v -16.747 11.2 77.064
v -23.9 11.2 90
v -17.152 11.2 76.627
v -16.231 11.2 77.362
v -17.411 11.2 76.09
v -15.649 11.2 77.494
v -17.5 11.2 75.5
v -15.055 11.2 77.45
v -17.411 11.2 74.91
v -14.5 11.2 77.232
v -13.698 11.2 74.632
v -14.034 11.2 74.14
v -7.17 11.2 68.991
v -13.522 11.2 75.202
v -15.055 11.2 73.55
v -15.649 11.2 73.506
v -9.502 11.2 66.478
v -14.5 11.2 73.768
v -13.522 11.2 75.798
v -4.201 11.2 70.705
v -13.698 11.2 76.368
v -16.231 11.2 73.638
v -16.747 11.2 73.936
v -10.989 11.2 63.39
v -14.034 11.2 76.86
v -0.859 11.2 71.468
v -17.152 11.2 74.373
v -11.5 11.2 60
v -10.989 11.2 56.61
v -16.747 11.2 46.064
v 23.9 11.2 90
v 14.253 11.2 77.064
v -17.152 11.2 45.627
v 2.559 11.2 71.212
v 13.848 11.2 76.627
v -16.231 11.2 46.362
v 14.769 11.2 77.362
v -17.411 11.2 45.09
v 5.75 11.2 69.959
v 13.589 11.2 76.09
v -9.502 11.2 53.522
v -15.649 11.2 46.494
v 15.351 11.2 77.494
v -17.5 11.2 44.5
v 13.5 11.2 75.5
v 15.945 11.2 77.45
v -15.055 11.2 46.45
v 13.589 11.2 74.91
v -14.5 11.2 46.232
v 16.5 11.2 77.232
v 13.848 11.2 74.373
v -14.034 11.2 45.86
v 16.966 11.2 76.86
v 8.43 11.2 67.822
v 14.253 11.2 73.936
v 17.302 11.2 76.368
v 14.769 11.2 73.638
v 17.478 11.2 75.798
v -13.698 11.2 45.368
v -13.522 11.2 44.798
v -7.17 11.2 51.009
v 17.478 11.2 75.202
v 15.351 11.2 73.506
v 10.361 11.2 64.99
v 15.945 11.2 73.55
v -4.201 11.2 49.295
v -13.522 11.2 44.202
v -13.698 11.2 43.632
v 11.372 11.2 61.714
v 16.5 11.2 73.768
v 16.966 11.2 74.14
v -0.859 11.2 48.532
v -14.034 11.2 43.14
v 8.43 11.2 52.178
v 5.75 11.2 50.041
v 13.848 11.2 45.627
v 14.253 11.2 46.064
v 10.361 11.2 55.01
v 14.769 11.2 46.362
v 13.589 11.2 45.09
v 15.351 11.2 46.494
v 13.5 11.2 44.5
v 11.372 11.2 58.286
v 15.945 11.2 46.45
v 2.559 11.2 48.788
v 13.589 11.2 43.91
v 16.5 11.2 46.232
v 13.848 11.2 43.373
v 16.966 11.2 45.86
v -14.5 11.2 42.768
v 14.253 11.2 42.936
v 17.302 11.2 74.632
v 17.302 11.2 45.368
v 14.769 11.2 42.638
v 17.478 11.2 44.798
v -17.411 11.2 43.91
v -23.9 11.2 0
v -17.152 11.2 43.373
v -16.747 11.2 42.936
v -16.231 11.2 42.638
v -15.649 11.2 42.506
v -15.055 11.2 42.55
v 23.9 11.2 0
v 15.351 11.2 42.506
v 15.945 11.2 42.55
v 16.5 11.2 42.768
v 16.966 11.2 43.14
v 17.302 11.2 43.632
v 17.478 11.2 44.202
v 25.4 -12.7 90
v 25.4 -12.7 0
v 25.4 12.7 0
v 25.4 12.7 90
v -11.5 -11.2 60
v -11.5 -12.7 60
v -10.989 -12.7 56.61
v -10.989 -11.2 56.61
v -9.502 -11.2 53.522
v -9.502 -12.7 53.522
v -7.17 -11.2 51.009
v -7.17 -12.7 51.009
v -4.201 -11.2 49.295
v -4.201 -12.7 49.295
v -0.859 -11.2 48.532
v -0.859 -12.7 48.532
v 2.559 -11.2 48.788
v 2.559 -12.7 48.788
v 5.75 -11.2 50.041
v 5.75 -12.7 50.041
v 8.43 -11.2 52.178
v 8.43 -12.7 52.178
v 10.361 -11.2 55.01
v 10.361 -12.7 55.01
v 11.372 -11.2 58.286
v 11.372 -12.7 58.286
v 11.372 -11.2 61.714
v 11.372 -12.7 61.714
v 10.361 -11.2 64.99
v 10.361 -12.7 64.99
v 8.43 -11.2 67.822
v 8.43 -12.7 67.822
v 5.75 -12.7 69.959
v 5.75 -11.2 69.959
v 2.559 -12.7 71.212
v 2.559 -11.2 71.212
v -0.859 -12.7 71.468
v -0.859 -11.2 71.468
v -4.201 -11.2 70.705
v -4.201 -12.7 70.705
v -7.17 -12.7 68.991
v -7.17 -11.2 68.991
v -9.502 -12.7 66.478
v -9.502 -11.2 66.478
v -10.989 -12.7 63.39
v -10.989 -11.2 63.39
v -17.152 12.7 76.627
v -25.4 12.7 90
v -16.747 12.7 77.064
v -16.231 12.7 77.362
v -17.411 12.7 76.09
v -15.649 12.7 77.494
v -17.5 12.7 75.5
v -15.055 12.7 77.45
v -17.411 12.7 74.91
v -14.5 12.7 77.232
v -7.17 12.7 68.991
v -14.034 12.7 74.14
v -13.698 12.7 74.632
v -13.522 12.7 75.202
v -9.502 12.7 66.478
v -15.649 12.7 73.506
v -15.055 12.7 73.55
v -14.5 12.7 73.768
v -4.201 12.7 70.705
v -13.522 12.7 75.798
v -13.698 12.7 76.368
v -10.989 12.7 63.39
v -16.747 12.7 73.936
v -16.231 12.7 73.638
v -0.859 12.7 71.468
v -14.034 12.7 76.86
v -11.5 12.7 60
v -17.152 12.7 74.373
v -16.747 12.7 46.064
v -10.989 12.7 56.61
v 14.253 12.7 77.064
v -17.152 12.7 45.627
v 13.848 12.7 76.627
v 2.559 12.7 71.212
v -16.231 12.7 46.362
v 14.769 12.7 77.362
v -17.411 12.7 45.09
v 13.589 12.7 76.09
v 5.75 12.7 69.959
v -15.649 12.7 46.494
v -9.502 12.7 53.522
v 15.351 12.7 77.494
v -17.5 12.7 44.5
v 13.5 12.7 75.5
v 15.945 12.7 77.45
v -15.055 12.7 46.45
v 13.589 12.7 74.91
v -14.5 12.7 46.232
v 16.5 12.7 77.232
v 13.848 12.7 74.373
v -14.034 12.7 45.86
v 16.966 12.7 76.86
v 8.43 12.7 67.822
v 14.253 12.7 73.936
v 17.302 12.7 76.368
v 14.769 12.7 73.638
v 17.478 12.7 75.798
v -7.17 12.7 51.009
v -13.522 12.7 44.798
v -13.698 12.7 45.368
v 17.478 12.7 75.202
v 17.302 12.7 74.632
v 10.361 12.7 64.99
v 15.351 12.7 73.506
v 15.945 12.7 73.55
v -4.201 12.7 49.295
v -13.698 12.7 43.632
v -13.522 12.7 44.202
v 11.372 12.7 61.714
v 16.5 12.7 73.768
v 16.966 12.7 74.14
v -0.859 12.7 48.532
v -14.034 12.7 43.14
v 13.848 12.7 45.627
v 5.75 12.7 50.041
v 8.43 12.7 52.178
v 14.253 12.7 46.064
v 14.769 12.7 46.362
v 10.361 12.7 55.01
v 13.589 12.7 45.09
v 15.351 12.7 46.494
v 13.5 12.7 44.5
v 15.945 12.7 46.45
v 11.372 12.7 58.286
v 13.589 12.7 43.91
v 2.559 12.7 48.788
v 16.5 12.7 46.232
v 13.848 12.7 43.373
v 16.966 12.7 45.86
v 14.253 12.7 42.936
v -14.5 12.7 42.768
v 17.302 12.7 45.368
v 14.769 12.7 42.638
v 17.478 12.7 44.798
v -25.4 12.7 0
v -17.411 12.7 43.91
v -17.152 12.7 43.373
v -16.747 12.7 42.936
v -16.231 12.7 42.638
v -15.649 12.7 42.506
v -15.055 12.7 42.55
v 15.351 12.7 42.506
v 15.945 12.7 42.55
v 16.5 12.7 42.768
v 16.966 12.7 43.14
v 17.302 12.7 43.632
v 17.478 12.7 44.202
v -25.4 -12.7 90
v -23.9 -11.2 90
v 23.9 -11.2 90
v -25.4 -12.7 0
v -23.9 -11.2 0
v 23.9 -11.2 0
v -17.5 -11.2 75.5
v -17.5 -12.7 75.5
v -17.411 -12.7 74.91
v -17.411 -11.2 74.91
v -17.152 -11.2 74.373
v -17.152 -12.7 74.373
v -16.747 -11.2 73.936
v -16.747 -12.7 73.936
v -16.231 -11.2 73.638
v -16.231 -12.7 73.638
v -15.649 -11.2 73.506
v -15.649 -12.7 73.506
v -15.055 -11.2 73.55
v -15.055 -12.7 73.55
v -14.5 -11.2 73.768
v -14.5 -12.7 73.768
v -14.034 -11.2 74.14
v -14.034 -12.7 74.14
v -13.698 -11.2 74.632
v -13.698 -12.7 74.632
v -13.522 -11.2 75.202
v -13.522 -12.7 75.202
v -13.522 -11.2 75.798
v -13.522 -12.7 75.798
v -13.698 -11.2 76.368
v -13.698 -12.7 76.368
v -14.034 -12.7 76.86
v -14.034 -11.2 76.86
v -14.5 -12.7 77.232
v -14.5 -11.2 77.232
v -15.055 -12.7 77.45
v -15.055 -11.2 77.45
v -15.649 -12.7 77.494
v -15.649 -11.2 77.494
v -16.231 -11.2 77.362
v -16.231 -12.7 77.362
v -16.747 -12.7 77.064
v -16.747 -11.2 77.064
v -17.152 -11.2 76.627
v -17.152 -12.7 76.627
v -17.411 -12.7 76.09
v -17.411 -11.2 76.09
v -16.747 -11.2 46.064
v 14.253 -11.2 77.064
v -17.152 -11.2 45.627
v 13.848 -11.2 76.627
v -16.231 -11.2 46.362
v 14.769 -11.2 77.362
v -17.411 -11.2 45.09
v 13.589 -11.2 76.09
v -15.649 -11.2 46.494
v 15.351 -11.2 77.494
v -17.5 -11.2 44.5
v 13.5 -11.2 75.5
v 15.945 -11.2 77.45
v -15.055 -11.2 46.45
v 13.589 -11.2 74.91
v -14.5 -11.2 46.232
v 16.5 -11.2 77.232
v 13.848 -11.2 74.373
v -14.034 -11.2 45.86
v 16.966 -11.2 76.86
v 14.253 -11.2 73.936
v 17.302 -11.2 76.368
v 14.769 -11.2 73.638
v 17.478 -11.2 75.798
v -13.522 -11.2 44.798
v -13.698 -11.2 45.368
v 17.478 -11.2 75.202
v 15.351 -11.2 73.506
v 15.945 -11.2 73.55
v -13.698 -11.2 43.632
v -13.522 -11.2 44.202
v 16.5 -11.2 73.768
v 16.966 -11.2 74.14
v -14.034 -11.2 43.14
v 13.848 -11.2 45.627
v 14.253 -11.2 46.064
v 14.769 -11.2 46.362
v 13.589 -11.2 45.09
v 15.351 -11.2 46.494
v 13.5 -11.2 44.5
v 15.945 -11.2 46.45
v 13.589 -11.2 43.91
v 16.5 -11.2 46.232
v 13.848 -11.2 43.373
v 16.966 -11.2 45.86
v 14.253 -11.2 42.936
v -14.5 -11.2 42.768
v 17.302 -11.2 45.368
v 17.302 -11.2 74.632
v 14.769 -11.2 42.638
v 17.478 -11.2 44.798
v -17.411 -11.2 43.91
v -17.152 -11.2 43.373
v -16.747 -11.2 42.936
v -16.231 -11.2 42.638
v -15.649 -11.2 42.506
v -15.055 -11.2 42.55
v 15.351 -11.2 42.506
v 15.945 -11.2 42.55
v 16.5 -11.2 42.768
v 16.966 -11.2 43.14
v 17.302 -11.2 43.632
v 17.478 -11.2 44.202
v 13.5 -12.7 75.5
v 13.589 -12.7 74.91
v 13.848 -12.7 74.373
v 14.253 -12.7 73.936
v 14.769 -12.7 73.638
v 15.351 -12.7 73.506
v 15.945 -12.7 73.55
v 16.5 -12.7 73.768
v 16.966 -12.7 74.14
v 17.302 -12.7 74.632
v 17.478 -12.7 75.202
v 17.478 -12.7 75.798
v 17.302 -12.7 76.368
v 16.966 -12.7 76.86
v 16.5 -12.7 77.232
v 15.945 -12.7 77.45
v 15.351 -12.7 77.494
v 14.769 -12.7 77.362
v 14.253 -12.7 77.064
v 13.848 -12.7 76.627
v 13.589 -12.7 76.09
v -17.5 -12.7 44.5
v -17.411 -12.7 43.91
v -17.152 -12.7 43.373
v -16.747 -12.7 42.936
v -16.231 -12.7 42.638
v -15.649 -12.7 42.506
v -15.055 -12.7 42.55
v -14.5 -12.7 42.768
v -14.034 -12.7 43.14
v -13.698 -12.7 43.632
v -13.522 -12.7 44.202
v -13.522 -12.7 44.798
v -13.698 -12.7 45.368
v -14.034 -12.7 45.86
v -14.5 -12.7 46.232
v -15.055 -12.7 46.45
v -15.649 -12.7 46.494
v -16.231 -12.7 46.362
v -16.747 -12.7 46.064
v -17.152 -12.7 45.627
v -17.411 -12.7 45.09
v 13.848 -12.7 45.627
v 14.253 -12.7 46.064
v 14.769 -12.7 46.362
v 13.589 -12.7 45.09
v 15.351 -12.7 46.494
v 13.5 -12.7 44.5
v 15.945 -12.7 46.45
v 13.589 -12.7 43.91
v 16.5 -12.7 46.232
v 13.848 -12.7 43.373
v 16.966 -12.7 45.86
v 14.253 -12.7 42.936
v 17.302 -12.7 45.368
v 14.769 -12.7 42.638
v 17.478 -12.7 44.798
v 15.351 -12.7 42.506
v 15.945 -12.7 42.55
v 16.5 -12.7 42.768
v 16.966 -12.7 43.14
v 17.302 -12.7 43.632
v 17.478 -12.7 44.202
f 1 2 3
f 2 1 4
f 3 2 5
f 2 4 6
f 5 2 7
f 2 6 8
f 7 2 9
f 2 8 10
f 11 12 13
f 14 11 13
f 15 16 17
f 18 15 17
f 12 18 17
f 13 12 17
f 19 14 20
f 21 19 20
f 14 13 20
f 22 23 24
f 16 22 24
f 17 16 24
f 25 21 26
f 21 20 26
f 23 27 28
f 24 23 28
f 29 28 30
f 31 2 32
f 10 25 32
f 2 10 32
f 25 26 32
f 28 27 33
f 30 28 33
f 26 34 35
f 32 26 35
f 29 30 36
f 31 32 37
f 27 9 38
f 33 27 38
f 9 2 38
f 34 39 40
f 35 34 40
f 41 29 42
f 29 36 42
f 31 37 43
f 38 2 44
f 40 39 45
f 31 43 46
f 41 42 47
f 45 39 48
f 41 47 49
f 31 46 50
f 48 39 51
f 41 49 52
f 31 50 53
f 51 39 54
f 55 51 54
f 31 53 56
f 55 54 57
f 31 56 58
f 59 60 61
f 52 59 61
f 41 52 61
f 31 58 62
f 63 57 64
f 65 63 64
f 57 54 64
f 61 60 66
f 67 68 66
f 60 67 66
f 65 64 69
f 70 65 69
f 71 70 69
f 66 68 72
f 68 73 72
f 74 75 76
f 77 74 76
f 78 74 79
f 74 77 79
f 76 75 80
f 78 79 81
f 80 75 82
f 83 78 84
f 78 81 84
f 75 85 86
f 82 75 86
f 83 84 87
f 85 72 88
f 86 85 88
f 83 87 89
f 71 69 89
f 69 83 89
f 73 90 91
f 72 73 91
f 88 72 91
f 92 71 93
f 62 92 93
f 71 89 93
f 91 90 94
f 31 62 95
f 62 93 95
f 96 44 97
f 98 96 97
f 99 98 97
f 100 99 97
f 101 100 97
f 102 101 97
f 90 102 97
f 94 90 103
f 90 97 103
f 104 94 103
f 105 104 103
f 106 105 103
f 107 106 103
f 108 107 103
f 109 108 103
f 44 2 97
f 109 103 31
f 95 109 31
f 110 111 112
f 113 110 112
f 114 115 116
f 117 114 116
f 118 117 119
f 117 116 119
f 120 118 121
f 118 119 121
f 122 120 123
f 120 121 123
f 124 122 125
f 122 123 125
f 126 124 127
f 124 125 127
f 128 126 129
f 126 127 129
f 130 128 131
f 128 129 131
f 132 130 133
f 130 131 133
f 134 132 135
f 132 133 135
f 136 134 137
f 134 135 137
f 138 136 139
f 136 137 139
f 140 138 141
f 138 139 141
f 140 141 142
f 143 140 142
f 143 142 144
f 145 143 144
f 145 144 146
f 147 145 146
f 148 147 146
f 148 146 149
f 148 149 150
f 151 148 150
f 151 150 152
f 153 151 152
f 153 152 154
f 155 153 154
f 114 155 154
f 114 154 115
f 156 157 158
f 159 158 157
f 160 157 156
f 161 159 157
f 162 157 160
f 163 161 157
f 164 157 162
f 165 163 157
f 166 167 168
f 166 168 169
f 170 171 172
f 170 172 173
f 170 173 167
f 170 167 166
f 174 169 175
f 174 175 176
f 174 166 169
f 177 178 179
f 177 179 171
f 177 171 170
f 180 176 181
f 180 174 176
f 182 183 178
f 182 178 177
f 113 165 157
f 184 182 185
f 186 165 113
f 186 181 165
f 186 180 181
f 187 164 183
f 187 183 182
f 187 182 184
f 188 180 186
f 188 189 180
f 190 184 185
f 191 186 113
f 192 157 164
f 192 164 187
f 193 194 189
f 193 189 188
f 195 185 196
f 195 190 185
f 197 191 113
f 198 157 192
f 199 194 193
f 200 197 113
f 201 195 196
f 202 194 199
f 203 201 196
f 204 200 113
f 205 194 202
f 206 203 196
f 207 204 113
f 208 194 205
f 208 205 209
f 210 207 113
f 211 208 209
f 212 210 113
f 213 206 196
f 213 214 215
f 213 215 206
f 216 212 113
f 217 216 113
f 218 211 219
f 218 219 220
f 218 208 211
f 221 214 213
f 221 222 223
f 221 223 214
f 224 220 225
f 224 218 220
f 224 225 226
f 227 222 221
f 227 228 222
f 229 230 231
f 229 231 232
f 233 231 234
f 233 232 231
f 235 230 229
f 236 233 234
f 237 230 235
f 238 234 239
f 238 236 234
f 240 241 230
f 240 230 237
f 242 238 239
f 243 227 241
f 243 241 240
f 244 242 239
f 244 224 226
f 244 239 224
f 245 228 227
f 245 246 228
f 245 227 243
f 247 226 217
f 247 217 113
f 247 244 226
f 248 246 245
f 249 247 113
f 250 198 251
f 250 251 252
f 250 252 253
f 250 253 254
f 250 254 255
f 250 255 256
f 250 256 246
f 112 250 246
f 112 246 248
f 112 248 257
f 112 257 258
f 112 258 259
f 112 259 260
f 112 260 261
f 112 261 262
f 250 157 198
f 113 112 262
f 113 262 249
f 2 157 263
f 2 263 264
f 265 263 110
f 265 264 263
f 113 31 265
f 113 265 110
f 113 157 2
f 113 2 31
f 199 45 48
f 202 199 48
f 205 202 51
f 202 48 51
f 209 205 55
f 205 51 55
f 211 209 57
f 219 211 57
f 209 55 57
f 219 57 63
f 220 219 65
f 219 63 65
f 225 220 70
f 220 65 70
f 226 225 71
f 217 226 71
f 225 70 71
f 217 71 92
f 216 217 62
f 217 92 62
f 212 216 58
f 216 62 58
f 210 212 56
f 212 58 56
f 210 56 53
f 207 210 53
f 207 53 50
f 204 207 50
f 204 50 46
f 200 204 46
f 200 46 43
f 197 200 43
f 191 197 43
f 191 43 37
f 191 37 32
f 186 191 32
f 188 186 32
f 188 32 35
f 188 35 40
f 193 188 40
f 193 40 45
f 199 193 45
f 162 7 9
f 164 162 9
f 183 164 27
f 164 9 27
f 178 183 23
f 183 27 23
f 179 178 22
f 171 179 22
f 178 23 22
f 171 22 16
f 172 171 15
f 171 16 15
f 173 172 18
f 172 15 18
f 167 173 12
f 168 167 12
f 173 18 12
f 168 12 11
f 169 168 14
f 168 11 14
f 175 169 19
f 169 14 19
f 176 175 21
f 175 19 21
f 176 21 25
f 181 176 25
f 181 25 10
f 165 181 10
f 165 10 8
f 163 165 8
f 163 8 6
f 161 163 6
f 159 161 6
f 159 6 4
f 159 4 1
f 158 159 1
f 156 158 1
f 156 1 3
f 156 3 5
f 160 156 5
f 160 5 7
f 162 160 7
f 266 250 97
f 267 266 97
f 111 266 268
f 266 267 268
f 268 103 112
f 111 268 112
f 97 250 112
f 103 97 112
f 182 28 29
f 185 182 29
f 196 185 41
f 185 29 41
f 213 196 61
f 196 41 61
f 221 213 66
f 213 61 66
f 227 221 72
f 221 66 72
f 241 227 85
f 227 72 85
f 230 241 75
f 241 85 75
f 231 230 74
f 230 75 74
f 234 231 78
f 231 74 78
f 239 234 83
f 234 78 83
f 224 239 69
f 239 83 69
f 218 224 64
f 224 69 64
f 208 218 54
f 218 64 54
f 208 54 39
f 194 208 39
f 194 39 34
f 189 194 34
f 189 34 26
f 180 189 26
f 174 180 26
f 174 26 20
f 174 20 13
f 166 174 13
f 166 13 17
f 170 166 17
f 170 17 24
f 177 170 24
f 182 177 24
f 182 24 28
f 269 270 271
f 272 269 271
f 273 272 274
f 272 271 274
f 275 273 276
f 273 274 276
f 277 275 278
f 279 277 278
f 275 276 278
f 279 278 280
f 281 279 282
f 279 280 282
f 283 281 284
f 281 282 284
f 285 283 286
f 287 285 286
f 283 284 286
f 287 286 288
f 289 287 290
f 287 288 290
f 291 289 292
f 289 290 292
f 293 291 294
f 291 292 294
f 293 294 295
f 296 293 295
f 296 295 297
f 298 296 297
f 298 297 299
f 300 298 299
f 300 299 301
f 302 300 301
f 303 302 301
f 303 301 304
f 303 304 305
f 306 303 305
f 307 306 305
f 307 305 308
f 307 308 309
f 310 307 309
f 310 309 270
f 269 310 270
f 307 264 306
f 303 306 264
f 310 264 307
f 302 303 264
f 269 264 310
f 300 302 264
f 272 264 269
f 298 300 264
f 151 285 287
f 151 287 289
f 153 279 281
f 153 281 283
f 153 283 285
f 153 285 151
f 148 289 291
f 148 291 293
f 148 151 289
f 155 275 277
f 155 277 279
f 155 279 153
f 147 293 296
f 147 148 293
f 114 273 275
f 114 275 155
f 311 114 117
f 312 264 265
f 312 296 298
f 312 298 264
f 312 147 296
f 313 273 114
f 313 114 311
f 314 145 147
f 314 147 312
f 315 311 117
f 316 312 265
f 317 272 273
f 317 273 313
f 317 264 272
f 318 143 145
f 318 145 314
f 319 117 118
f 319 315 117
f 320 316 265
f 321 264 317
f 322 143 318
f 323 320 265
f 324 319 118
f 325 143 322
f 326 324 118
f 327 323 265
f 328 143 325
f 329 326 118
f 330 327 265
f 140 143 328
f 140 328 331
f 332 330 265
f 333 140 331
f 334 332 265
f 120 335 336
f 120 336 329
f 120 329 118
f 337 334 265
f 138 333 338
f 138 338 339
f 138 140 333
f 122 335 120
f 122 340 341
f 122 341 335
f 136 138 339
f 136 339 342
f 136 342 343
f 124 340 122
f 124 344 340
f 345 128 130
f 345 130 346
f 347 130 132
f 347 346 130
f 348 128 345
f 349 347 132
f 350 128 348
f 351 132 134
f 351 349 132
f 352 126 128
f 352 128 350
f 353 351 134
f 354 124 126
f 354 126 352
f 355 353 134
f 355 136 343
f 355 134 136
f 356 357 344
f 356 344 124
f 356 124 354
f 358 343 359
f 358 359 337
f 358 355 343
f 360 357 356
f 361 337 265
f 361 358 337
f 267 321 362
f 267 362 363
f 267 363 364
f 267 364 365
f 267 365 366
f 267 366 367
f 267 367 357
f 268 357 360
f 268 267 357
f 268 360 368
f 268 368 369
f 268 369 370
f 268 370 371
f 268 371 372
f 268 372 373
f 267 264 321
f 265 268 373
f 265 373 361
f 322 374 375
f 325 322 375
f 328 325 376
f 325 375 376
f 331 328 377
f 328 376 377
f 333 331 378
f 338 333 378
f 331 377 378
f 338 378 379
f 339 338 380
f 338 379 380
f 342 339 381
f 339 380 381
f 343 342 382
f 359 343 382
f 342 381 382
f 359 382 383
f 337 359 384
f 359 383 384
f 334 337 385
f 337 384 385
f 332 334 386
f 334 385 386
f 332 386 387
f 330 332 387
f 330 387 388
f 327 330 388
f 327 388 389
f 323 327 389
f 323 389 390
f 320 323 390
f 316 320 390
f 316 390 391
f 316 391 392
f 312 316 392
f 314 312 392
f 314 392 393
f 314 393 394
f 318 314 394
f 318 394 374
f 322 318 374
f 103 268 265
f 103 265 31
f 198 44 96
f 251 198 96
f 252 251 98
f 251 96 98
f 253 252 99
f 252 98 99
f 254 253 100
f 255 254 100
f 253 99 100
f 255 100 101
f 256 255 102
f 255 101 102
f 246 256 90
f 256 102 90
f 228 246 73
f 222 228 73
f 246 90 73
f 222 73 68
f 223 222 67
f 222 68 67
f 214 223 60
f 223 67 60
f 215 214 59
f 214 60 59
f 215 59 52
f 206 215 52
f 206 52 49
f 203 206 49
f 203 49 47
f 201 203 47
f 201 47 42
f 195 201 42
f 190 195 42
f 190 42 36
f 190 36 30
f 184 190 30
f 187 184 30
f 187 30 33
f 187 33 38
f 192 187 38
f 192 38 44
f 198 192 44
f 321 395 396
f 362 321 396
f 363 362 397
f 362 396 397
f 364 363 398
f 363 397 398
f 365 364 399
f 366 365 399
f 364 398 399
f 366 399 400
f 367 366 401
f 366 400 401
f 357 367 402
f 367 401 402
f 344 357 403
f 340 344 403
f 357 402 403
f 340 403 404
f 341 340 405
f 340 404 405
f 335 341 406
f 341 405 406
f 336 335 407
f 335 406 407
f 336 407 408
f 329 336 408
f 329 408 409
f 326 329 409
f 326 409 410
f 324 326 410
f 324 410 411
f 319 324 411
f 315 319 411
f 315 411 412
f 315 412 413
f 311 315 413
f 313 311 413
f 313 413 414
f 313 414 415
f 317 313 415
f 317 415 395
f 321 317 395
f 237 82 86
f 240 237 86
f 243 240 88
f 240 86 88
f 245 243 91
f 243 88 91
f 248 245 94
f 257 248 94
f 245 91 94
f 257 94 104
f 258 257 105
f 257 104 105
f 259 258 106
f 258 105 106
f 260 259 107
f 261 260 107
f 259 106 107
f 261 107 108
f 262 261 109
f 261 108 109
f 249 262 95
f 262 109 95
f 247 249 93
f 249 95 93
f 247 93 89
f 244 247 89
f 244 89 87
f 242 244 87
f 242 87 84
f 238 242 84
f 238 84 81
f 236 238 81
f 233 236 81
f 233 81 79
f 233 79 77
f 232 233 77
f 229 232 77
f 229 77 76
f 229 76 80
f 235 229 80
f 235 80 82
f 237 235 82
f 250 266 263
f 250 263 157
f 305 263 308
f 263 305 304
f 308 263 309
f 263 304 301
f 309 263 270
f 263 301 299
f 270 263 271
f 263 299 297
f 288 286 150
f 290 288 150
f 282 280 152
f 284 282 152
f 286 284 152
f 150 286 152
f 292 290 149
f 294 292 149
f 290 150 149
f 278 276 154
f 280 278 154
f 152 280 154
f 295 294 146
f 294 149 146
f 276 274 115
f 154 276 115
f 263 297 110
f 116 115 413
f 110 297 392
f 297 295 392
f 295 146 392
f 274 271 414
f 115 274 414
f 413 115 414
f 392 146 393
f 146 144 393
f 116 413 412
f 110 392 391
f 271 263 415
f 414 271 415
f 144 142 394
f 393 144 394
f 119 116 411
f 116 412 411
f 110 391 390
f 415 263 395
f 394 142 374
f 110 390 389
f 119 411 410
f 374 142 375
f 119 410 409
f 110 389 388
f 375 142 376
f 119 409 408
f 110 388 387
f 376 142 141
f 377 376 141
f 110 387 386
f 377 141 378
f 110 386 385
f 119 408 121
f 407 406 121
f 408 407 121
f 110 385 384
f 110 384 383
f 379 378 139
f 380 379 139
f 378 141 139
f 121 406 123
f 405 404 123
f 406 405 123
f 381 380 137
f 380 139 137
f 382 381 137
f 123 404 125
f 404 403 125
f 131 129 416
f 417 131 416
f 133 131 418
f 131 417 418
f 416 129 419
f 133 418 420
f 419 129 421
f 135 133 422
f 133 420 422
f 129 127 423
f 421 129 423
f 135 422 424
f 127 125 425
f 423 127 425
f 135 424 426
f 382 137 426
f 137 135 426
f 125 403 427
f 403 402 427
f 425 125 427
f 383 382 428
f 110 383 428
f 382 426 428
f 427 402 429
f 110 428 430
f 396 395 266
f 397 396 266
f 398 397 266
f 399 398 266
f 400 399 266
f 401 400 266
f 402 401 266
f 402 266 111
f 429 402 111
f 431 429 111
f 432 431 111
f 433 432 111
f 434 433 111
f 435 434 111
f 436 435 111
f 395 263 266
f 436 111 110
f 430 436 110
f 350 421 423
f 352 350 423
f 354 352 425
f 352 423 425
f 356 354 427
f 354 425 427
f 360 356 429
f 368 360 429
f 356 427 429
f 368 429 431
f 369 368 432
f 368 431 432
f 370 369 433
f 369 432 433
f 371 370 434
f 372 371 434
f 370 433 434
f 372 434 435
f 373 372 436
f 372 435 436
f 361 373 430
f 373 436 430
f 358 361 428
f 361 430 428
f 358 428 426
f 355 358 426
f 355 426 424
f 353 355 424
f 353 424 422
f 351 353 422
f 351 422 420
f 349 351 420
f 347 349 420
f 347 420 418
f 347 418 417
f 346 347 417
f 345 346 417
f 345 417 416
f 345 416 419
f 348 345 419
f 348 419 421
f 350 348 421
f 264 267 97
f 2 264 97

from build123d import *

# Parameters (mm, degrees)
CROQUIS1_W              = 50.8
CROQUIS1_H              = 25.4
CROQUIS1_W_2            = 47.8
CROQUIS1_H_2            = 22.4
SALIENTE_EXTRUIR1_DEPTH = 90
CROQUIS2_R              = 11.5
CROQUIS2_R_2            = 2
CORTAR_EXTRUIR1_DEPTH   = 26


with BuildPart() as part:
    # Croquis1 → Saliente-Extruir1 (new body)
    with BuildSketch(Plane.XY):
        Rectangle(CROQUIS1_W, CROQUIS1_H)
        Rectangle(CROQUIS1_W_2, CROQUIS1_H_2, mode=Mode.SUBTRACT)
    extrude(amount=SALIENTE_EXTRUIR1_DEPTH)

    # Croquis2 → Cortar-Extruir1 (cut)
    with BuildSketch(Plane(origin=(0, -12.7, 0), x_dir=(-1, 0, 0), z_dir=(0, -1, 0))):
        with Locations((0, -60)):
            Circle(CROQUIS2_R)
        with Locations((15.5, -75.5)):
            Circle(CROQUIS2_R_2)
        with Locations((-15.5, -75.5)):
            Circle(CROQUIS2_R_2)
        with Locations((-15.5, -44.5)):
            Circle(CROQUIS2_R_2)
        with Locations((15.5, -44.5)):
            Circle(CROQUIS2_R_2)
    extrude(amount=-CORTAR_EXTRUIR1_DEPTH, mode=Mode.SUBTRACT)


solid = part.part
